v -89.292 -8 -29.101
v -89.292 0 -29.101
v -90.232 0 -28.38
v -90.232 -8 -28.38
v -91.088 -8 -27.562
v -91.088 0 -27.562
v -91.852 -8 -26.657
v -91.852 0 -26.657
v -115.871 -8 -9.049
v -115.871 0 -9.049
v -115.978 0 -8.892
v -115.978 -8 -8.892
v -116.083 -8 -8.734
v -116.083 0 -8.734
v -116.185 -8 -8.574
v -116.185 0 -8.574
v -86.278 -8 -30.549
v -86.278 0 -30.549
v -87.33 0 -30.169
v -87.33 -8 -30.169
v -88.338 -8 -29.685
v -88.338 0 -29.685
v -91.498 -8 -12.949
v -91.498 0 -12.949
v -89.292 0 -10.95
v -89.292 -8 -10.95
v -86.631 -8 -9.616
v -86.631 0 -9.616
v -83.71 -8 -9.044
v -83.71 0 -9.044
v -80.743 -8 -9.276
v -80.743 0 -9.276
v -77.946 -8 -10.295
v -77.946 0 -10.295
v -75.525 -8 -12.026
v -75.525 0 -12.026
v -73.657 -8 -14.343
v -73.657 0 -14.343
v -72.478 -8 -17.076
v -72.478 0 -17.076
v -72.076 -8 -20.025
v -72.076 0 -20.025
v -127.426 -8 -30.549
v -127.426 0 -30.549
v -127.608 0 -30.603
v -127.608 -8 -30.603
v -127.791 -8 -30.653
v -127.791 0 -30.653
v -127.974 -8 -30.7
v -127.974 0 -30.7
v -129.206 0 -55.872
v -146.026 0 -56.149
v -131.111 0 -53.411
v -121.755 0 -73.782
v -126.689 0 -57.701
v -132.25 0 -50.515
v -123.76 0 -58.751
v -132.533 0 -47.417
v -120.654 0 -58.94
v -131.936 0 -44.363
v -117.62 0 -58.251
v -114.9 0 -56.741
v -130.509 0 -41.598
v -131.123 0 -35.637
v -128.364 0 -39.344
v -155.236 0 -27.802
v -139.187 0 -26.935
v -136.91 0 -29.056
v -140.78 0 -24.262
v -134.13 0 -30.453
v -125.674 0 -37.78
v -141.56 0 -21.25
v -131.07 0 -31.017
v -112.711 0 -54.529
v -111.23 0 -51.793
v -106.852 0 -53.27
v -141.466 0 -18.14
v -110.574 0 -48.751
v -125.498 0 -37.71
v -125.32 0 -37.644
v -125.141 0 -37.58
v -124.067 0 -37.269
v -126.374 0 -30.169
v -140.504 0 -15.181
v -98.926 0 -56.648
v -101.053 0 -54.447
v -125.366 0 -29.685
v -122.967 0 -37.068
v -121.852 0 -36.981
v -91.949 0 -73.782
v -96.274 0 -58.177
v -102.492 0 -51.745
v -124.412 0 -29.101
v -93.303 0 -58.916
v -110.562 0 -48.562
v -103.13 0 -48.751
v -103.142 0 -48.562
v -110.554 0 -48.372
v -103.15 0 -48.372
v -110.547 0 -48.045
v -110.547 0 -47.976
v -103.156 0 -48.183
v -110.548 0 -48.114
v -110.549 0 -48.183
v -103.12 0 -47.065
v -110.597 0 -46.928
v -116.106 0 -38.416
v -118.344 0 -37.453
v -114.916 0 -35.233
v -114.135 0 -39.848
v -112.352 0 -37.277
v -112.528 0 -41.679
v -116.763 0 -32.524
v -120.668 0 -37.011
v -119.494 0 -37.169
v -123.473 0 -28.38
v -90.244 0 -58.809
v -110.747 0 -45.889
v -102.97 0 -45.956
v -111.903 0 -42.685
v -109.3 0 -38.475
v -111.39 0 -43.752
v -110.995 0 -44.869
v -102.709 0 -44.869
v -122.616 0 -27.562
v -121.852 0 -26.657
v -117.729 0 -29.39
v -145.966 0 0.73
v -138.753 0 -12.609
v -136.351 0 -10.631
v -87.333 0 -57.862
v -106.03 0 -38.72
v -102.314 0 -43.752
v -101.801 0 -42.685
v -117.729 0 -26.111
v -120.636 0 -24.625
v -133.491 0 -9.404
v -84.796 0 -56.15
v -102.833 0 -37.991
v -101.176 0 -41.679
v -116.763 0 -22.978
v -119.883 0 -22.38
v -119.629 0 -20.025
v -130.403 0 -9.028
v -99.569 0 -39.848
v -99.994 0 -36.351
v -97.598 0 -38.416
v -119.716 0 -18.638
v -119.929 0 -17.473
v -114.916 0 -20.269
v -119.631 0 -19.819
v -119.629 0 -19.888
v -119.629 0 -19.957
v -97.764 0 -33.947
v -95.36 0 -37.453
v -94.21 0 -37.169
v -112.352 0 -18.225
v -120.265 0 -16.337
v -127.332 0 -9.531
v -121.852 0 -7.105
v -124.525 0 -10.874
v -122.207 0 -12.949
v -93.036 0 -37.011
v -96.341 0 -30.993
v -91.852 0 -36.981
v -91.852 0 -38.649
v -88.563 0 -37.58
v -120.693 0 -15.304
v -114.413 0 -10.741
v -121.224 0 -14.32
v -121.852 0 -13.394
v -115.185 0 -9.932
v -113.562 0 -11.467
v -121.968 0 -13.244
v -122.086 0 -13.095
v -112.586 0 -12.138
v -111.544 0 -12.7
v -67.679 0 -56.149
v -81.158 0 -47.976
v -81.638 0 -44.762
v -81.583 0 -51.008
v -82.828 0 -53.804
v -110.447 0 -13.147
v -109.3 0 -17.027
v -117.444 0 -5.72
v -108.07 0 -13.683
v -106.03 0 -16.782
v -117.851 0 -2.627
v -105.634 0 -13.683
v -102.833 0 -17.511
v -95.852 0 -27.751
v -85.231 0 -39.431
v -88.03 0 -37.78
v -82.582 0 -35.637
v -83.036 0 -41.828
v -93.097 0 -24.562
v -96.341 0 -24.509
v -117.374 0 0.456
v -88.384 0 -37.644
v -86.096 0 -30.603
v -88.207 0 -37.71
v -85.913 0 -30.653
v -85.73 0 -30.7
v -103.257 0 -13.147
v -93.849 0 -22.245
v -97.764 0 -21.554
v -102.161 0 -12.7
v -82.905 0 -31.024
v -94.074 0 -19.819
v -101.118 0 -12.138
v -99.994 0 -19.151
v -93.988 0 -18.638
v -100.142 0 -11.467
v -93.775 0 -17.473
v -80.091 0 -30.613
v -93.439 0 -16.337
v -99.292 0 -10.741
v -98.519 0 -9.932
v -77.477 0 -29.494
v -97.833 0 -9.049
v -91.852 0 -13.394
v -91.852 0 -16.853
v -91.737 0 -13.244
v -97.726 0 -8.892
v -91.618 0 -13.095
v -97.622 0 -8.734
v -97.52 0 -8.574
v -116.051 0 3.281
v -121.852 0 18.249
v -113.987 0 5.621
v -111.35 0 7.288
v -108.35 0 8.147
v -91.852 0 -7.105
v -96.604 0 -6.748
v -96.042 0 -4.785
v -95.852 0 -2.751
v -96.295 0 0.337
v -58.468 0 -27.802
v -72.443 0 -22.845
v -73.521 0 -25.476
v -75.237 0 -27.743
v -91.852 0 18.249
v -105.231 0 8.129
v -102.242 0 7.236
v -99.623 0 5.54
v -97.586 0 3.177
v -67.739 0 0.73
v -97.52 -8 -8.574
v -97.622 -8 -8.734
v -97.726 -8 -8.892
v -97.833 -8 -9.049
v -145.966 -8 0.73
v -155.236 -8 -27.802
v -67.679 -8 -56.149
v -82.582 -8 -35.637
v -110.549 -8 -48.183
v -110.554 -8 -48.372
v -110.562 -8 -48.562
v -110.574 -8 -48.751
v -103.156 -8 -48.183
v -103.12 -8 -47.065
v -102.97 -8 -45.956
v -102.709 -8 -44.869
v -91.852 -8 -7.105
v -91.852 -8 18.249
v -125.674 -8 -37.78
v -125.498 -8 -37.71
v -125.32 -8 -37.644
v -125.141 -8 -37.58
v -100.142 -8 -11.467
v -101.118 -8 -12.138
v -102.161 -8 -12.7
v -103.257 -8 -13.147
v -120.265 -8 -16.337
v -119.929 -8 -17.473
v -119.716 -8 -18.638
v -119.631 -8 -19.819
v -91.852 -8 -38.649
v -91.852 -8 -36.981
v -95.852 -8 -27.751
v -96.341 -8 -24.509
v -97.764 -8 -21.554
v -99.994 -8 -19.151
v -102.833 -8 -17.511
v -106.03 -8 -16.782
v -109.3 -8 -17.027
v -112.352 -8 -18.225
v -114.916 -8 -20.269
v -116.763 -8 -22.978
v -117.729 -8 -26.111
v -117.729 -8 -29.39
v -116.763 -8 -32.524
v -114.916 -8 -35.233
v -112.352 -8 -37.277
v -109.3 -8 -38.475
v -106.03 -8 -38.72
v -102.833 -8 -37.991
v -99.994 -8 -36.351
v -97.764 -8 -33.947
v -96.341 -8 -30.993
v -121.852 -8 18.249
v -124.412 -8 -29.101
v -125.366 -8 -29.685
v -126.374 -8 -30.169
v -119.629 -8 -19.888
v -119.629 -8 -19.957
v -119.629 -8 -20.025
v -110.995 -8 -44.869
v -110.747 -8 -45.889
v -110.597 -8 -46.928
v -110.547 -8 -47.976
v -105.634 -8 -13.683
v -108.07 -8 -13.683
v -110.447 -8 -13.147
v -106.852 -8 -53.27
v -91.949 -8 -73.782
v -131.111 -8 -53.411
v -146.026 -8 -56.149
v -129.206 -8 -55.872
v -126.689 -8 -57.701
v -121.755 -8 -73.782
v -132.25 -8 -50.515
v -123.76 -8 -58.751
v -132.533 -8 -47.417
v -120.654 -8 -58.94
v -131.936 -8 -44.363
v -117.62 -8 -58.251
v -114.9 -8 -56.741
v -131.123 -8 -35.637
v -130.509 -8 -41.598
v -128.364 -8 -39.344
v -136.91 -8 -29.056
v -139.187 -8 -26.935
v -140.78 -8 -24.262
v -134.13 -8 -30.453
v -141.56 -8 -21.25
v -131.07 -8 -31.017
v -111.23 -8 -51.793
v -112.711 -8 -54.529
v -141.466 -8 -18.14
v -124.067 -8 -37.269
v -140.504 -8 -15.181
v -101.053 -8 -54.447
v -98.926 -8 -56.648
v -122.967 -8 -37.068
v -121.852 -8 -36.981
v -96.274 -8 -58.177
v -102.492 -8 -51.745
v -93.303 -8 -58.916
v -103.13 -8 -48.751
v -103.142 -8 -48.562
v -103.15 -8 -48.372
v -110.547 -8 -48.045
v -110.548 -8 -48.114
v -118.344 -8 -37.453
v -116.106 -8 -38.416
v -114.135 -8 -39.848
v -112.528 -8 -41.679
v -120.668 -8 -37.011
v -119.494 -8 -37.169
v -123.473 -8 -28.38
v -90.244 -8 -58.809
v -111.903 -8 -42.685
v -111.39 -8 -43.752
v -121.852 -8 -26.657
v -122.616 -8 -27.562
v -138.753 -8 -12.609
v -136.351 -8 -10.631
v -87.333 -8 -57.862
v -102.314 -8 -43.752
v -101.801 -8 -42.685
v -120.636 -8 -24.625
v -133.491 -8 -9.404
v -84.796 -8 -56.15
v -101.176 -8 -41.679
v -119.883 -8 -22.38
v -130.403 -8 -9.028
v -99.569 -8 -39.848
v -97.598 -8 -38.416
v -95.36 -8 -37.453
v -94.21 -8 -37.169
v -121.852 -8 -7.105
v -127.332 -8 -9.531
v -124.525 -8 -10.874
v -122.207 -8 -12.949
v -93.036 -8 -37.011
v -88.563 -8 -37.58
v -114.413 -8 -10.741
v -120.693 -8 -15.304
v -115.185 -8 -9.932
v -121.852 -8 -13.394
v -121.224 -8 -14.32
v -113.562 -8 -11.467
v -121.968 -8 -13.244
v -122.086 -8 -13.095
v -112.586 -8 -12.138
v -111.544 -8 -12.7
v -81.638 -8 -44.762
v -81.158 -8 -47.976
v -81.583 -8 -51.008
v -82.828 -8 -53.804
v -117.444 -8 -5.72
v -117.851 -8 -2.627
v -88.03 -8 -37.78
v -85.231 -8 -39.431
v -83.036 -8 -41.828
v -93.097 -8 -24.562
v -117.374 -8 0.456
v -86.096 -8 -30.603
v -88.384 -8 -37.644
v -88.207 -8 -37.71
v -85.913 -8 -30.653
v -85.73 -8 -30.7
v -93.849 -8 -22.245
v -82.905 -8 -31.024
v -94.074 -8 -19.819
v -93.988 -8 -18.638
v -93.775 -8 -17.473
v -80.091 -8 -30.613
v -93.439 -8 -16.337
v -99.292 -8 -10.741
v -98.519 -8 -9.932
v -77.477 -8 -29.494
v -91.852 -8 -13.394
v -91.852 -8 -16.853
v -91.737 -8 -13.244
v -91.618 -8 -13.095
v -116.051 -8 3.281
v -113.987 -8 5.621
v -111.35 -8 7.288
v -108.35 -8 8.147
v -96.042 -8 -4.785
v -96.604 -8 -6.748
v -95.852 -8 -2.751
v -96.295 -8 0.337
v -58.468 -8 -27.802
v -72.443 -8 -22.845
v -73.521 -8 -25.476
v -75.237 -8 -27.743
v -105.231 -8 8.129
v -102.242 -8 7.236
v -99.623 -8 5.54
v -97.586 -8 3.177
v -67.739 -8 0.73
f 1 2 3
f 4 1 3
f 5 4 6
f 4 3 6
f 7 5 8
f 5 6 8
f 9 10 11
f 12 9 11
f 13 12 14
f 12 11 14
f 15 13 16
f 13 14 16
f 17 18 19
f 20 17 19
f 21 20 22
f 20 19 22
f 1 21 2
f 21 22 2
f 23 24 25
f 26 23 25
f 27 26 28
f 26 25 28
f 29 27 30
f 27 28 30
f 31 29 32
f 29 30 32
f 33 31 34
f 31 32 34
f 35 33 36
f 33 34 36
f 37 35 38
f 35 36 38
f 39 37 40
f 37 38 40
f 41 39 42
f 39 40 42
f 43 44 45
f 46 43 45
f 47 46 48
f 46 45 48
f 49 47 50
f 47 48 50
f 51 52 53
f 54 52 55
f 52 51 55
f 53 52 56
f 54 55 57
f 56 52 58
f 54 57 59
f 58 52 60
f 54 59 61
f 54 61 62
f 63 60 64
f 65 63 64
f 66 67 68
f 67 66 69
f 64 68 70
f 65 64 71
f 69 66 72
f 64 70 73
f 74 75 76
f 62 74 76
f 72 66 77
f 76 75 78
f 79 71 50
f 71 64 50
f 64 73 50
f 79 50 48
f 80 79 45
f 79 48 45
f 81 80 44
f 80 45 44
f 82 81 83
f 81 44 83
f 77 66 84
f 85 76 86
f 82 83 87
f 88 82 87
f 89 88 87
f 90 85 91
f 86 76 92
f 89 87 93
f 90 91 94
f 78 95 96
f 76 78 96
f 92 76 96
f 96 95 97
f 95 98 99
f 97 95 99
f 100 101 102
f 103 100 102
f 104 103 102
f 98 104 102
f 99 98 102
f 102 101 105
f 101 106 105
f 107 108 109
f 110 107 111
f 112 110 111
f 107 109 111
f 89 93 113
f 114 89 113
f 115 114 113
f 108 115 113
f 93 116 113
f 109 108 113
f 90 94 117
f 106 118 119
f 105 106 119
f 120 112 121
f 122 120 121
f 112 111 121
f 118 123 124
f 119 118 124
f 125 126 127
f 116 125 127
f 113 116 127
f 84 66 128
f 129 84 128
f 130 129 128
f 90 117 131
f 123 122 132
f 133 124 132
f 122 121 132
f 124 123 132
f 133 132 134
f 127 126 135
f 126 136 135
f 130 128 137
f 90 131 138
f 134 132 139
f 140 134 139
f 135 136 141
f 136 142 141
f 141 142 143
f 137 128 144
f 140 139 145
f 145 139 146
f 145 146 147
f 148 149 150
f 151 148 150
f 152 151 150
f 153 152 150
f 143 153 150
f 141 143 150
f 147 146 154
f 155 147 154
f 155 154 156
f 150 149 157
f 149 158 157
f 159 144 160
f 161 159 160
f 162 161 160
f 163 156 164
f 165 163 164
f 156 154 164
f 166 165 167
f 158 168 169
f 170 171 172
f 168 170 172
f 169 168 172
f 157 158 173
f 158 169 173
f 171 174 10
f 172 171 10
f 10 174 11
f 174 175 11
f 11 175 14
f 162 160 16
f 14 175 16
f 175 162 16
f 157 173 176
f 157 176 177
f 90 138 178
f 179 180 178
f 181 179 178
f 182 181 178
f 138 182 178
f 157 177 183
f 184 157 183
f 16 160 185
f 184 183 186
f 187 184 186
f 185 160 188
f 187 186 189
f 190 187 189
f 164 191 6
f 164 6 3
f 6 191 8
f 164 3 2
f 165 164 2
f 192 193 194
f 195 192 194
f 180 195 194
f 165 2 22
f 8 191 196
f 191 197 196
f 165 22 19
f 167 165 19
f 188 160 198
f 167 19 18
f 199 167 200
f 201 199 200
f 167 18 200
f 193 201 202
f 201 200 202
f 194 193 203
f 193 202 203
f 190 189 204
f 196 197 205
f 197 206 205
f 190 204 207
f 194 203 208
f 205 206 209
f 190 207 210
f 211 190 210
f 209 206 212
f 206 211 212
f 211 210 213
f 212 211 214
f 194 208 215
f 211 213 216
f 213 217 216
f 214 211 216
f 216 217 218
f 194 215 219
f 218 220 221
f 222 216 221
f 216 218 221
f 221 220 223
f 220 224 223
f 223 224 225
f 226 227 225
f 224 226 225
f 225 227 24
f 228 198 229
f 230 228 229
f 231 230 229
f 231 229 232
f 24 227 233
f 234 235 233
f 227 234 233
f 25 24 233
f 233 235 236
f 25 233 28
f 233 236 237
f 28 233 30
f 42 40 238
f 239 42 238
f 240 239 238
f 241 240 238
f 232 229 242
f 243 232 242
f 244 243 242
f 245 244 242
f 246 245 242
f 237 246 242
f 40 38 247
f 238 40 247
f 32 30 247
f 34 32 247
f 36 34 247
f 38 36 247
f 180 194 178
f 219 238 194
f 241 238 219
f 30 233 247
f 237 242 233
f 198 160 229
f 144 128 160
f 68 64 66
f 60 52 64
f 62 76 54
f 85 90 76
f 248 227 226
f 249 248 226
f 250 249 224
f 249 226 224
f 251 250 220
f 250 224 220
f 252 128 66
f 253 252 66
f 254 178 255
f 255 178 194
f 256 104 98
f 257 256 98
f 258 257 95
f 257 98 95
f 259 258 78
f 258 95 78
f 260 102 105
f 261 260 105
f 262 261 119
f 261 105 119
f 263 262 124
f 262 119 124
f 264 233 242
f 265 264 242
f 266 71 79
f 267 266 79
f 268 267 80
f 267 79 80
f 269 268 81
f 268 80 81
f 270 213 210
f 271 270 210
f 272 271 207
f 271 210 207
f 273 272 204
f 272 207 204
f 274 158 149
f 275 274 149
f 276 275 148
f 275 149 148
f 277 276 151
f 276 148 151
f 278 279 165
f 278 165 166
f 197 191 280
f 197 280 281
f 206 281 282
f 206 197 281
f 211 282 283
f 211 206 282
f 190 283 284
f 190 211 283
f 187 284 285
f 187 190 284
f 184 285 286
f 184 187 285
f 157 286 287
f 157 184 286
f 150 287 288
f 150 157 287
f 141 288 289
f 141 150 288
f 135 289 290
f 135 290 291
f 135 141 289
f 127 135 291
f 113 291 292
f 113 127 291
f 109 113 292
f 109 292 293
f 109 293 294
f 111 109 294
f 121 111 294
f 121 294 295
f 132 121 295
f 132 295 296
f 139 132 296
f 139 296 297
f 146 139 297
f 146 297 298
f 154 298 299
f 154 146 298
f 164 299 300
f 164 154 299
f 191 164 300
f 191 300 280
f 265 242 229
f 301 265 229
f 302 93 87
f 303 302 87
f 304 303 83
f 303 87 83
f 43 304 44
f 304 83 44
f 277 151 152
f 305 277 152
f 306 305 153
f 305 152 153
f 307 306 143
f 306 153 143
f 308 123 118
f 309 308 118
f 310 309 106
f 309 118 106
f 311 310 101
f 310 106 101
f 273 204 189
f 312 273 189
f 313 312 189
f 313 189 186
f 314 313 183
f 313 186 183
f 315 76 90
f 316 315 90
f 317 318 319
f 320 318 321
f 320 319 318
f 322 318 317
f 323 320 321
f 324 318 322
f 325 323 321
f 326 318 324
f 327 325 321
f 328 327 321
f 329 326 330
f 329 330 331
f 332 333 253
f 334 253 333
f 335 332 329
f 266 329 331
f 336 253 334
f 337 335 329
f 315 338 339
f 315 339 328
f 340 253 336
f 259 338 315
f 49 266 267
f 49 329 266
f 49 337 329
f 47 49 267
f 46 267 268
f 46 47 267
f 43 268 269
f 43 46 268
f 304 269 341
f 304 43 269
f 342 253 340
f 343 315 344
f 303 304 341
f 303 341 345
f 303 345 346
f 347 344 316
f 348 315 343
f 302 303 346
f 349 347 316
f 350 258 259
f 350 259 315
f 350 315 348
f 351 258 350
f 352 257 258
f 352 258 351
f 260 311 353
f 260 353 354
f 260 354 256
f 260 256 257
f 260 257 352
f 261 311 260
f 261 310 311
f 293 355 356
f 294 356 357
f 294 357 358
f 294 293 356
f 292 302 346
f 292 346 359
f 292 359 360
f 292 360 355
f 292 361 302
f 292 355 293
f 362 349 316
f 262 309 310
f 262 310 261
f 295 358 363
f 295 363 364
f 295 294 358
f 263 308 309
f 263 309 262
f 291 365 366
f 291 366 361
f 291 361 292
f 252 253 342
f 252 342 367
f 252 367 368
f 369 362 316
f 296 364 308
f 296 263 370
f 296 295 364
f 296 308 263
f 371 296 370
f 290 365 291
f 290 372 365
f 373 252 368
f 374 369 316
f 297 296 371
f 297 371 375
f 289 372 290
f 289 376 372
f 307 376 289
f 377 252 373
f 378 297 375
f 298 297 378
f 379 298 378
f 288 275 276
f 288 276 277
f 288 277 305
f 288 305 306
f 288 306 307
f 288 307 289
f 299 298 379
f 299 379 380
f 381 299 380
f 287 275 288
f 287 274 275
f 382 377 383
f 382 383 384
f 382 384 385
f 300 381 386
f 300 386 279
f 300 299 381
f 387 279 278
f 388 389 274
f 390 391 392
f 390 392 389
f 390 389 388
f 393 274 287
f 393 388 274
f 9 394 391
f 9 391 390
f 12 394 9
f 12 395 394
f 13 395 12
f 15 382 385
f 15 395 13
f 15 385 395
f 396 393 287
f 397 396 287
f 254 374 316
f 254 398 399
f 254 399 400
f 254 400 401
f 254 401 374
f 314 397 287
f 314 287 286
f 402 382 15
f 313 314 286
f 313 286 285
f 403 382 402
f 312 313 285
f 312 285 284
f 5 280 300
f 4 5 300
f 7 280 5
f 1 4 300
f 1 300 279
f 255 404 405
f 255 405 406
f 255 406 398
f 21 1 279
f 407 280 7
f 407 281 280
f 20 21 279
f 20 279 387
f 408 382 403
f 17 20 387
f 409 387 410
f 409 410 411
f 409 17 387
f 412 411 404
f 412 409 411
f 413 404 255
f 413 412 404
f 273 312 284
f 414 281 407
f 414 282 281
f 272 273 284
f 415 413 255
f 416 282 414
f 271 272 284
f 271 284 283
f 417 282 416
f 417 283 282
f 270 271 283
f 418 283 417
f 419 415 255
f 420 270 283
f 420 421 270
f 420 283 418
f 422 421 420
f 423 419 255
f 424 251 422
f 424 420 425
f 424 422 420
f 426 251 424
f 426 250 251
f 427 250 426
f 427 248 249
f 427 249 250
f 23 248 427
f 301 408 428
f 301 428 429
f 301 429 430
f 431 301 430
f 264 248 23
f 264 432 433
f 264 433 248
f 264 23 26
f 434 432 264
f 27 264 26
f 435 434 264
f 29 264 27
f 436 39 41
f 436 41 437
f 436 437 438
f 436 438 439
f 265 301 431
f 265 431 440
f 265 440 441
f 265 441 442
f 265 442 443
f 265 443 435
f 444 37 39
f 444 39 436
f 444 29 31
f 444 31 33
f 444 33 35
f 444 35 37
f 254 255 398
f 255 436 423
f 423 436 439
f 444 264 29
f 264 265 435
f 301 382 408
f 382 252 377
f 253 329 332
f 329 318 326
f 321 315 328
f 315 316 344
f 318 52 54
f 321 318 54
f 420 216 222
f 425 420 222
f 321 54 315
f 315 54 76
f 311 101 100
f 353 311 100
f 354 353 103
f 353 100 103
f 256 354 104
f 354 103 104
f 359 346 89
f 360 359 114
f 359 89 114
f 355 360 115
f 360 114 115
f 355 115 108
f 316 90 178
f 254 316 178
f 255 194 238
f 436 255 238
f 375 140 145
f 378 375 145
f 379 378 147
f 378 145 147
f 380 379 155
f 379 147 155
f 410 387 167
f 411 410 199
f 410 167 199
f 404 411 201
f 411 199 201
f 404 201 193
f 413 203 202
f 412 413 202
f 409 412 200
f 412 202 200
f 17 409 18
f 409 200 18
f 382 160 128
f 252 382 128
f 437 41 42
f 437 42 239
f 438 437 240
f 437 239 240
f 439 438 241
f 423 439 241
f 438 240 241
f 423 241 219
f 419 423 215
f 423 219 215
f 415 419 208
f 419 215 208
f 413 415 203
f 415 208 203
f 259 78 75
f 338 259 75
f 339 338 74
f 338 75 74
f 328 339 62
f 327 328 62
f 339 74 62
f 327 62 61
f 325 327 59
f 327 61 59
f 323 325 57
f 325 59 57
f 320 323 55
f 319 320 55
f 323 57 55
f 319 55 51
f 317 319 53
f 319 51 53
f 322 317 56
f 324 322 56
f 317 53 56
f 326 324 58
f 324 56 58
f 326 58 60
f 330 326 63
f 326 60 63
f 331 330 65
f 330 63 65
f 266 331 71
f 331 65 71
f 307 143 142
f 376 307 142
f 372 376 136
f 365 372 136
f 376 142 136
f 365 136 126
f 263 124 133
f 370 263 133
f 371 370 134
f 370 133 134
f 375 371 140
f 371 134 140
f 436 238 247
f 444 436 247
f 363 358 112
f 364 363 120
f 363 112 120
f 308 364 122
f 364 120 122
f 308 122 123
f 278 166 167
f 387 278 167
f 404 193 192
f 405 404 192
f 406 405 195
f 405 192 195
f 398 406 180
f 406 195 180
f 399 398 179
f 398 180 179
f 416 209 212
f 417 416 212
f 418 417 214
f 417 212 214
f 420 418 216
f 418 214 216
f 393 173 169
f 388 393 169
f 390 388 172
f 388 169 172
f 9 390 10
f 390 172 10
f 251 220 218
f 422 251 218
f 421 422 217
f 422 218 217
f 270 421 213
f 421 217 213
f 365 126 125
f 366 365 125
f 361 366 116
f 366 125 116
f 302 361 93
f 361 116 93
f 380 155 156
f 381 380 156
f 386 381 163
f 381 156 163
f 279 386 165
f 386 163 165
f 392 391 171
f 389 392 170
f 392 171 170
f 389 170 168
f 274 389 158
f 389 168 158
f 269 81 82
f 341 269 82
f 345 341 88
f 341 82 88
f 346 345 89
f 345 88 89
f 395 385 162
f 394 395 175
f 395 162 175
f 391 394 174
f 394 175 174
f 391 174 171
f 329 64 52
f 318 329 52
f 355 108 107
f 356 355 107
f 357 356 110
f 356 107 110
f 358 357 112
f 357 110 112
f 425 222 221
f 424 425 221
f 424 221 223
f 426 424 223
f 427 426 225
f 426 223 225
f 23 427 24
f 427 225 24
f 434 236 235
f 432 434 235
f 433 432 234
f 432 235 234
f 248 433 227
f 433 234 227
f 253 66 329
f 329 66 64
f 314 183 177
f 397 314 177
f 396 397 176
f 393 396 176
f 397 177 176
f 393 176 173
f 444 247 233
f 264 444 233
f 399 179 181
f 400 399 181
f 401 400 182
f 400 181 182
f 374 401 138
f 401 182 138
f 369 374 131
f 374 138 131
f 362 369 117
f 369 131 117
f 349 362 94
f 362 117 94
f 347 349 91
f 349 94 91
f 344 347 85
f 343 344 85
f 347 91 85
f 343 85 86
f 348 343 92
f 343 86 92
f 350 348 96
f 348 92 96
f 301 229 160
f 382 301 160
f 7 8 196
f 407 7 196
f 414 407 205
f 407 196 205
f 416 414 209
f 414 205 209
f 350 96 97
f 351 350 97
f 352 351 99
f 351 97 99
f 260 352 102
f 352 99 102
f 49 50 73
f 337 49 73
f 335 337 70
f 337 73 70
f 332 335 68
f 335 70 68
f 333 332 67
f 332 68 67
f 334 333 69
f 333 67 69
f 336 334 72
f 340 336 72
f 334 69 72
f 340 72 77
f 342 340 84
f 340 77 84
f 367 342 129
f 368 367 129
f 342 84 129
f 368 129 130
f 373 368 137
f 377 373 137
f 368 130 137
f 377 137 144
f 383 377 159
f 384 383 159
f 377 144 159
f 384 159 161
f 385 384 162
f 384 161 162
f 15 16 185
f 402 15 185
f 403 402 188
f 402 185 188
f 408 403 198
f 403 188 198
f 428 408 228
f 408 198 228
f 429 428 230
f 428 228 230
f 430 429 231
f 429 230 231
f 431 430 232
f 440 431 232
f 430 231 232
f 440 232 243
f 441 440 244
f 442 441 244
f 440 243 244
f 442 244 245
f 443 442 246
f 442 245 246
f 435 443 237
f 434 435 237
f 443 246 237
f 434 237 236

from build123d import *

# Parameters (mm, degrees)
F0_R     = 11
F1_DEPTH = 8


with BuildPart() as f1:
    # F0 (on Front) → F1 (new body)
    with BuildSketch(Plane.XZ):
        with BuildLine():
            Line((-89.2918408091, -29.1007133896), (-91.8521562923, -32.6246853314))
            Line((-91.8521562923, -32.6246853314), (-91.8521562923, -36.9805542024))
            ThreePointArc((-91.8521562923, -36.9805542024), (-90.1845660146, -37.1546959728), (-88.5628133246, -37.5802554901))
            Line((-88.5628133246, -37.5802554901), (-87.8946658648, -37.3631612204))
            Line((-87.8946658648, -37.3631612204), (-85.8652730355, -31.1173323192))
            Line((-85.8652730355, -31.1173323192), (-86.2782108751, -30.5489721424))
            ThreePointArc((-86.2782108751, -30.5489721424), (-87.8403739703, -29.94001471), (-89.2918408091, -29.1007133896))
        make_face()
        with BuildLine():
            Line((-91.8521562923, -7.1051610809), (-91.8521562923, -12.6916002805))
            Line((-91.8521562923, -12.6916002805), (-91.4975561881, -12.9492323367))
            ThreePointArc((-91.4975561881, -12.9492323367), (-79.3101053802, -9.6900903175), (-72.0757433849, -20.0254650286))
            ThreePointArc((-72.0757433849, -20.0254650286), (-76.3006023936, -28.6913443577), (-85.729827848, -30.7004748957))
            Line((-85.729827848, -30.7004748957), (-85.8652730355, -31.1173323192))
            Line((-85.8652730355, -31.1173323192), (-82.5816464611, -35.6368565697))
            Line((-82.5816464611, -35.6368565697), (-58.4683016271, -27.8019558911))
            Line((-58.4683016271, -27.8019558911), (-67.7388114584, 0.7297395977))
            Line((-67.7388114584, 0.7297395977), (-91.8521562923, -7.1051610809))
        make_face()
        with BuildLine():
            Line((-97.165175696, -8.8314657316), (-97.8333231559, -9.0485600013))
            ThreePointArc((-97.8333231559, -9.0485600013), (-98.8952110345, -10.346087197), (-100.1419619443, -11.4671558208))
            Line((-100.1419619443, -11.4671558208), (-97.5816464611, -14.9911277626))
            Line((-97.5816464611, -14.9911277626), (-93.4389689872, -16.337165269))
            ThreePointArc((-93.4389689872, -16.337165269), (-92.7580365863, -14.8050054354), (-91.8521562923, -13.3941320947))
            Line((-91.8521562923, -13.3941320947), (-91.8521562923, -12.6916002805))
            Line((-91.8521562923, -12.6916002805), (-97.165175696, -8.8314657316))
        make_face()
        with BuildLine():
            Line((-110.5487207064, -48.1825297111), (-110.1357828667, -48.7508898879))
            Line((-110.1357828667, -48.7508898879), (-103.5685297179, -48.7508898879))
            Line((-103.5685297179, -48.7508898879), (-103.1555918783, -48.1825297111))
            ThreePointArc((-103.1555918783, -48.1825297111), (-103.0591738884, -46.5086461245), (-102.7094788185, -44.8688607579))
            Line((-102.7094788185, -44.8688607579), (-106.8521562923, -43.5228232515))
            Line((-106.8521562923, -43.5228232515), (-110.9948337662, -44.8688607579))
            ThreePointArc((-110.9948337662, -44.8688607579), (-110.6593753229, -46.4065205201), (-110.5467875996, -47.9763147473))
            ThreePointArc((-110.5467875996, -47.9763147473), (-110.5472708869, -48.0794267595), (-110.5487207064, -48.1825297111))
        make_face()
        Polygon((-121.8521562923, -12.6916002805), (-116.5391368886, -8.8314657316), (-121.8521562923, -7.1051610809), align=None)
        Polygon((-110.1357828667, -48.7508898879), (-106.8521562923, -53.2704141385), (-103.5685297179, -48.7508898879), align=None)
        with BuildLine():
            Line((-67.6787797712, -56.1488928448), (-82.5816464611, -35.6368565697))
            Line((-82.5816464611, -35.6368565697), (-87.8946658648, -37.3631612204))
            Line((-87.8946658648, -37.3631612204), (-88.0301110522, -37.7800186439))
            ThreePointArc((-88.0301110522, -37.7800186439), (-83.0360790124, -41.8282074475), (-81.157524985, -47.9763147473))
            ThreePointArc((-81.157524985, -47.9763147473), (-91.7699968515, -58.9694863527), (-103.1302198842, -48.7508898879))
            Line((-103.1302198842, -48.7508898879), (-103.5685297179, -48.7508898879))
            Line((-103.5685297179, -48.7508898879), (-106.8521562923, -53.2704141385))
            Line((-106.8521562923, -53.2704141385), (-91.9492896025, -73.7824504136))
            Line((-91.9492896025, -73.7824504136), (-67.6787797712, -56.1488928448))
        make_face()
        with BuildLine():
            Line((-125.8096467199, -37.3631612204), (-131.1226661236, -35.6368565697))
            Line((-131.1226661236, -35.6368565697), (-146.0255328134, -56.1488928448))
            Line((-146.0255328134, -56.1488928448), (-121.7550229822, -73.7824504136))
            Line((-121.7550229822, -73.7824504136), (-106.8521562923, -53.2704141385))
            Line((-106.8521562923, -53.2704141385), (-110.1357828667, -48.7508898879))
            Line((-110.1357828667, -48.7508898879), (-110.5740927004, -48.7508898879))
            ThreePointArc((-110.5740927004, -48.7508898879), (-128.0124253749, -56.8755016854), (-125.6742015324, -37.7800186439))
            Line((-125.6742015324, -37.7800186439), (-125.8096467199, -37.3631612204))
        make_face()
        with BuildLine():
            ThreePointArc((-113.5623506403, -11.4671558208), (-114.8091015502, -10.346087197), (-115.8709894288, -9.0485600013))
            Line((-115.8709894288, -9.0485600013), (-116.5391368886, -8.8314657316))
            Line((-116.5391368886, -8.8314657316), (-121.8521562923, -12.6916002805))
            Line((-121.8521562923, -12.6916002805), (-121.8521562923, -13.3941320947))
            ThreePointArc((-121.8521562923, -13.3941320947), (-120.9462759984, -14.8050054354), (-120.2653435974, -16.337165269))
            Line((-120.2653435974, -16.337165269), (-116.1226661236, -14.9911277626))
            Line((-116.1226661236, -14.9911277626), (-113.5623506403, -11.4671558208))
        make_face()
        with BuildLine():
            ThreePointArc((-116.1845367843, -8.5738336754), (-109.8806719839, 7.8239903812), (-95.8521562923, -2.7508898879))
            ThreePointArc((-95.8521562923, -2.7508898879), (-96.2772760232, -5.7794055795), (-97.5197758003, -8.5738336754))
            Line((-97.5197758003, -8.5738336754), (-97.165175696, -8.8314657316))
            Line((-97.165175696, -8.8314657316), (-91.8521562923, -7.1051610809))
            Line((-91.8521562923, -7.1051610809), (-91.8521562923, 18.2491101121))
            Line((-91.8521562923, 18.2491101121), (-121.8521562923, 18.2491101121))
            Line((-121.8521562923, 18.2491101121), (-121.8521562923, -7.1051610809))
            Line((-121.8521562923, -7.1051610809), (-116.5391368886, -8.8314657316))
            Line((-116.5391368886, -8.8314657316), (-116.1845367843, -8.5738336754))
        make_face()
        with BuildLine():
            Line((-121.8521562923, -12.6916002805), (-121.8521562923, -7.1051610809))
            Line((-121.8521562923, -7.1051610809), (-145.9655011263, 0.7297395977))
            Line((-145.9655011263, 0.7297395977), (-155.2360109575, -27.8019558911))
            Line((-155.2360109575, -27.8019558911), (-131.1226661236, -35.6368565697))
            Line((-131.1226661236, -35.6368565697), (-127.8390395492, -31.1173323192))
            Line((-127.8390395492, -31.1173323192), (-127.9744847366, -30.7004748957))
            ThreePointArc((-127.9744847366, -30.7004748957), (-141.0901908789, -16.6262780904), (-122.2067563966, -12.9492323367))
            Line((-122.2067563966, -12.9492323367), (-121.8521562923, -12.6916002805))
        make_face()
        Polygon((-91.8521562923, -7.1051610809), (-97.165175696, -8.8314657316), (-91.8521562923, -12.6916002805), align=None)
        with BuildLine():
            ThreePointArc((-110.4468679527, -13.1469491451), (-112.0726158855, -12.4331830893), (-113.5623506403, -11.4671558208))
            Line((-113.5623506403, -11.4671558208), (-116.1226661236, -14.9911277626))
            Line((-116.1226661236, -14.9911277626), (-110.4468679527, -13.1469491451))
        make_face()
        with BuildLine():
            Line((-97.165175696, -8.8314657316), (-97.5197758003, -8.5738336754))
            ThreePointArc((-97.5197758003, -8.5738336754), (-97.6734798256, -8.8132242831), (-97.8333231559, -9.0485600013))
            Line((-97.8333231559, -9.0485600013), (-97.165175696, -8.8314657316))
        make_face()
        with BuildLine():
            ThreePointArc((-102.7094788185, -44.8688607579), (-102.0720746664, -43.2116841619), (-101.1763581215, -41.678644634))
            Line((-101.1763581215, -41.678644634), (-106.8521562923, -43.5228232515))
            Line((-106.8521562923, -43.5228232515), (-102.7094788185, -44.8688607579))
        make_face()
        with BuildLine():
            ThreePointArc((-115.8709894288, -9.0485600013), (-116.030832759, -8.8132242831), (-116.1845367843, -8.5738336754))
            Line((-116.1845367843, -8.5738336754), (-116.5391368886, -8.8314657316))
            Line((-116.5391368886, -8.8314657316), (-115.8709894288, -9.0485600013))
        make_face()
        with BuildLine():
            ThreePointArc((-127.4261017095, -30.5489721424), (-127.6993135833, -30.6282694469), (-127.9744847366, -30.7004748957))
            Line((-127.9744847366, -30.7004748957), (-127.8390395492, -31.1173323192))
            Line((-127.8390395492, -31.1173323192), (-127.4261017095, -30.5489721424))
        make_face()
        with BuildLine():
            Line((-97.5816464611, -14.9911277626), (-100.1419619443, -11.4671558208))
            ThreePointArc((-100.1419619443, -11.4671558208), (-101.6316966992, -12.4331830893), (-103.2574446319, -13.1469491451))
            Line((-103.2574446319, -13.1469491451), (-97.5816464611, -14.9911277626))
        make_face()
        with BuildLine():
            Line((-106.8521562923, -43.5228232515), (-112.5279544632, -41.678644634))
            ThreePointArc((-112.5279544632, -41.678644634), (-111.6322379182, -43.2116841619), (-110.9948337662, -44.8688607579))
            Line((-110.9948337662, -44.8688607579), (-106.8521562923, -43.5228232515))
        make_face()
        with BuildLine():
            Line((-93.4389689872, -16.337165269), (-97.5816464611, -14.9911277626))
            Line((-97.5816464611, -14.9911277626), (-94.0738102782, -19.8192500647))
            ThreePointArc((-94.0738102782, -19.8192500647), (-93.8973621595, -18.0525060582), (-93.4389689872, -16.337165269))
        make_face()
        Polygon((-127.8390395492, -31.1173323192), (-131.1226661236, -35.6368565697), (-125.8096467199, -37.3631612204), align=None)
        with BuildLine():
            ThreePointArc((-88.5628133246, -37.5802554901), (-90.1845660146, -37.1546959728), (-91.8521562923, -36.9805542024))
            Line((-91.8521562923, -36.9805542024), (-91.8521562923, -38.649027808))
            Line((-91.8521562923, -38.649027808), (-88.5628133246, -37.5802554901))
        make_face()
        with BuildLine():
            Line((-91.8521562923, -36.9805542024), (-91.8521562923, -32.6246853314))
            Line((-91.8521562923, -32.6246853314), (-95.3599924752, -37.4528076335))
            ThreePointArc((-95.3599924752, -37.4528076335), (-93.6251936078, -37.0746658439), (-91.8521562923, -36.9805542024))
        make_face()
        with BuildLine():
            ThreePointArc((-89.2918408091, -29.1007133896), (-90.670940694, -27.9824102864), (-91.8521562923, -26.6567979624))
            Line((-91.8521562923, -26.6567979624), (-91.8521562923, -32.6246853314))
            Line((-91.8521562923, -32.6246853314), (-89.2918408091, -29.1007133896))
        make_face()
        with BuildLine():
            Line((-121.8521562923, -32.6246853314), (-121.8521562923, -26.6567979624))
            ThreePointArc((-121.8521562923, -26.6567979624), (-123.0333718906, -27.9824102864), (-124.4124717756, -29.1007133896))
            Line((-124.4124717756, -29.1007133896), (-121.8521562923, -32.6246853314))
        make_face()
        with BuildLine():
            Line((-118.3443201095, -37.4528076335), (-121.8521562923, -32.6246853314))
            Line((-121.8521562923, -32.6246853314), (-121.8521562923, -36.9805542024))
            ThreePointArc((-121.8521562923, -36.9805542024), (-120.0791189768, -37.0746658439), (-118.3443201095, -37.4528076335))
        make_face()
        with BuildLine():
            Line((-91.4975561881, -12.9492323367), (-91.8521562923, -12.6916002805))
            Line((-91.8521562923, -12.6916002805), (-91.8521562923, -13.3941320947))
            ThreePointArc((-91.8521562923, -13.3941320947), (-91.6777330296, -13.1693893176), (-91.4975561881, -12.9492323367))
        make_face()
        with BuildLine():
            Line((-91.8521562923, -16.8527519678), (-91.8521562923, -13.3941320947))
            ThreePointArc((-91.8521562923, -13.3941320947), (-92.7580365863, -14.8050054354), (-93.4389689872, -16.337165269))
            Line((-93.4389689872, -16.337165269), (-91.8521562923, -16.8527519678))
        make_face()
        with BuildLine():
            Line((-119.6305023064, -19.8192500647), (-116.1226661236, -14.9911277626))
            Line((-116.1226661236, -14.9911277626), (-120.2653435974, -16.337165269))
            ThreePointArc((-120.2653435974, -16.337165269), (-119.8069504252, -18.0525060582), (-119.6305023064, -19.8192500647))
        make_face()
        Polygon((-87.8946658648, -37.3631612204), (-82.5816464611, -35.6368565697), (-85.8652730355, -31.1173323192), align=None)
        with BuildLine():
            Line((-85.8652730355, -31.1173323192), (-85.729827848, -30.7004748957))
            ThreePointArc((-85.729827848, -30.7004748957), (-86.0049990014, -30.6282694469), (-86.2782108751, -30.5489721424))
            Line((-86.2782108751, -30.5489721424), (-85.8652730355, -31.1173323192))
        make_face()
        with BuildLine():
            ThreePointArc((-110.5487207064, -48.1825297111), (-110.5577316002, -48.4668738587), (-110.5740927004, -48.7508898879))
            Line((-110.5740927004, -48.7508898879), (-110.1357828667, -48.7508898879))
            Line((-110.1357828667, -48.7508898879), (-110.5487207064, -48.1825297111))
        make_face()
        with BuildLine():
            Line((-103.1555918783, -48.1825297111), (-103.5685297179, -48.7508898879))
            Line((-103.5685297179, -48.7508898879), (-103.1302198842, -48.7508898879))
            ThreePointArc((-103.1302198842, -48.7508898879), (-103.1465809844, -48.4668738587), (-103.1555918783, -48.1825297111))
        make_face()
        with BuildLine():
            Line((-125.14149926, -37.5802554901), (-125.8096467199, -37.3631612204))
            Line((-125.8096467199, -37.3631612204), (-125.6742015324, -37.7800186439))
            ThreePointArc((-125.6742015324, -37.7800186439), (-125.4091420951, -37.6766925333), (-125.14149926, -37.5802554901))
        make_face()
        with BuildLine():
            Line((-121.8521562923, -13.3941320947), (-121.8521562923, -12.6916002805))
            Line((-121.8521562923, -12.6916002805), (-122.2067563966, -12.9492323367))
            ThreePointArc((-122.2067563966, -12.9492323367), (-122.0265795551, -13.1693893176), (-121.8521562923, -13.3941320947))
        make_face()
        with BuildLine():
            Line((-88.0301110522, -37.7800186439), (-87.8946658648, -37.3631612204))
            Line((-87.8946658648, -37.3631612204), (-88.5628133246, -37.5802554901))
            ThreePointArc((-88.5628133246, -37.5802554901), (-88.2951704895, -37.6766925333), (-88.0301110522, -37.7800186439))
        make_face()
        with BuildLine():
            ThreePointArc((-103.2574446319, -13.1469491451), (-106.8521562923, -13.7508898879), (-110.4468679527, -13.1469491451))
            Line((-110.4468679527, -13.1469491451), (-116.1226661236, -14.9911277626))
            Line((-116.1226661236, -14.9911277626), (-119.6305023064, -19.8192500647))
            ThreePointArc((-119.6305023064, -19.8192500647), (-119.629052487, -19.9223530164), (-119.6285691997, -20.0254650286))
            ThreePointArc((-119.6285691997, -20.0254650286), (-120.1992705181, -23.5225679738), (-121.8521562923, -26.6567979624))
            Line((-121.8521562923, -26.6567979624), (-121.8521562923, -32.6246853314))
            Line((-121.8521562923, -32.6246853314), (-118.3443201095, -37.4528076335))
            ThreePointArc((-118.3443201095, -37.4528076335), (-115.0811498244, -39.0771278092), (-112.5279544632, -41.678644634))
            Line((-112.5279544632, -41.678644634), (-106.8521562923, -43.5228232515))
            Line((-106.8521562923, -43.5228232515), (-101.1763581215, -41.678644634))
            ThreePointArc((-101.1763581215, -41.678644634), (-98.6231627602, -39.0771278092), (-95.3599924752, -37.4528076335))
            Line((-95.3599924752, -37.4528076335), (-91.8521562923, -32.6246853314))
            Line((-91.8521562923, -32.6246853314), (-91.8521562923, -26.6567979624))
            ThreePointArc((-91.8521562923, -26.6567979624), (-93.5373650642, -23.4246519667), (-94.0738102782, -19.8192500647))
            Line((-94.0738102782, -19.8192500647), (-97.5816464611, -14.9911277626))
            Line((-97.5816464611, -14.9911277626), (-103.2574446319, -13.1469491451))
        make_face()
        with Locations((-106.8521562923, -27.7508898879)):
            Circle(F0_R, mode=Mode.SUBTRACT)
        with BuildLine():
            ThreePointArc((-124.4124717756, -29.1007133896), (-125.8639386143, -29.94001471), (-127.4261017095, -30.5489721424))
            Line((-127.4261017095, -30.5489721424), (-127.8390395492, -31.1173323192))
            Line((-127.8390395492, -31.1173323192), (-125.8096467199, -37.3631612204))
            Line((-125.8096467199, -37.3631612204), (-125.14149926, -37.5802554901))
            ThreePointArc((-125.14149926, -37.5802554901), (-123.51974657, -37.1546959728), (-121.8521562923, -36.9805542024))
            Line((-121.8521562923, -36.9805542024), (-121.8521562923, -32.6246853314))
            Line((-121.8521562923, -32.6246853314), (-124.4124717756, -29.1007133896))
        make_face()
    extrude(amount=F1_DEPTH)


solid = f1.part
